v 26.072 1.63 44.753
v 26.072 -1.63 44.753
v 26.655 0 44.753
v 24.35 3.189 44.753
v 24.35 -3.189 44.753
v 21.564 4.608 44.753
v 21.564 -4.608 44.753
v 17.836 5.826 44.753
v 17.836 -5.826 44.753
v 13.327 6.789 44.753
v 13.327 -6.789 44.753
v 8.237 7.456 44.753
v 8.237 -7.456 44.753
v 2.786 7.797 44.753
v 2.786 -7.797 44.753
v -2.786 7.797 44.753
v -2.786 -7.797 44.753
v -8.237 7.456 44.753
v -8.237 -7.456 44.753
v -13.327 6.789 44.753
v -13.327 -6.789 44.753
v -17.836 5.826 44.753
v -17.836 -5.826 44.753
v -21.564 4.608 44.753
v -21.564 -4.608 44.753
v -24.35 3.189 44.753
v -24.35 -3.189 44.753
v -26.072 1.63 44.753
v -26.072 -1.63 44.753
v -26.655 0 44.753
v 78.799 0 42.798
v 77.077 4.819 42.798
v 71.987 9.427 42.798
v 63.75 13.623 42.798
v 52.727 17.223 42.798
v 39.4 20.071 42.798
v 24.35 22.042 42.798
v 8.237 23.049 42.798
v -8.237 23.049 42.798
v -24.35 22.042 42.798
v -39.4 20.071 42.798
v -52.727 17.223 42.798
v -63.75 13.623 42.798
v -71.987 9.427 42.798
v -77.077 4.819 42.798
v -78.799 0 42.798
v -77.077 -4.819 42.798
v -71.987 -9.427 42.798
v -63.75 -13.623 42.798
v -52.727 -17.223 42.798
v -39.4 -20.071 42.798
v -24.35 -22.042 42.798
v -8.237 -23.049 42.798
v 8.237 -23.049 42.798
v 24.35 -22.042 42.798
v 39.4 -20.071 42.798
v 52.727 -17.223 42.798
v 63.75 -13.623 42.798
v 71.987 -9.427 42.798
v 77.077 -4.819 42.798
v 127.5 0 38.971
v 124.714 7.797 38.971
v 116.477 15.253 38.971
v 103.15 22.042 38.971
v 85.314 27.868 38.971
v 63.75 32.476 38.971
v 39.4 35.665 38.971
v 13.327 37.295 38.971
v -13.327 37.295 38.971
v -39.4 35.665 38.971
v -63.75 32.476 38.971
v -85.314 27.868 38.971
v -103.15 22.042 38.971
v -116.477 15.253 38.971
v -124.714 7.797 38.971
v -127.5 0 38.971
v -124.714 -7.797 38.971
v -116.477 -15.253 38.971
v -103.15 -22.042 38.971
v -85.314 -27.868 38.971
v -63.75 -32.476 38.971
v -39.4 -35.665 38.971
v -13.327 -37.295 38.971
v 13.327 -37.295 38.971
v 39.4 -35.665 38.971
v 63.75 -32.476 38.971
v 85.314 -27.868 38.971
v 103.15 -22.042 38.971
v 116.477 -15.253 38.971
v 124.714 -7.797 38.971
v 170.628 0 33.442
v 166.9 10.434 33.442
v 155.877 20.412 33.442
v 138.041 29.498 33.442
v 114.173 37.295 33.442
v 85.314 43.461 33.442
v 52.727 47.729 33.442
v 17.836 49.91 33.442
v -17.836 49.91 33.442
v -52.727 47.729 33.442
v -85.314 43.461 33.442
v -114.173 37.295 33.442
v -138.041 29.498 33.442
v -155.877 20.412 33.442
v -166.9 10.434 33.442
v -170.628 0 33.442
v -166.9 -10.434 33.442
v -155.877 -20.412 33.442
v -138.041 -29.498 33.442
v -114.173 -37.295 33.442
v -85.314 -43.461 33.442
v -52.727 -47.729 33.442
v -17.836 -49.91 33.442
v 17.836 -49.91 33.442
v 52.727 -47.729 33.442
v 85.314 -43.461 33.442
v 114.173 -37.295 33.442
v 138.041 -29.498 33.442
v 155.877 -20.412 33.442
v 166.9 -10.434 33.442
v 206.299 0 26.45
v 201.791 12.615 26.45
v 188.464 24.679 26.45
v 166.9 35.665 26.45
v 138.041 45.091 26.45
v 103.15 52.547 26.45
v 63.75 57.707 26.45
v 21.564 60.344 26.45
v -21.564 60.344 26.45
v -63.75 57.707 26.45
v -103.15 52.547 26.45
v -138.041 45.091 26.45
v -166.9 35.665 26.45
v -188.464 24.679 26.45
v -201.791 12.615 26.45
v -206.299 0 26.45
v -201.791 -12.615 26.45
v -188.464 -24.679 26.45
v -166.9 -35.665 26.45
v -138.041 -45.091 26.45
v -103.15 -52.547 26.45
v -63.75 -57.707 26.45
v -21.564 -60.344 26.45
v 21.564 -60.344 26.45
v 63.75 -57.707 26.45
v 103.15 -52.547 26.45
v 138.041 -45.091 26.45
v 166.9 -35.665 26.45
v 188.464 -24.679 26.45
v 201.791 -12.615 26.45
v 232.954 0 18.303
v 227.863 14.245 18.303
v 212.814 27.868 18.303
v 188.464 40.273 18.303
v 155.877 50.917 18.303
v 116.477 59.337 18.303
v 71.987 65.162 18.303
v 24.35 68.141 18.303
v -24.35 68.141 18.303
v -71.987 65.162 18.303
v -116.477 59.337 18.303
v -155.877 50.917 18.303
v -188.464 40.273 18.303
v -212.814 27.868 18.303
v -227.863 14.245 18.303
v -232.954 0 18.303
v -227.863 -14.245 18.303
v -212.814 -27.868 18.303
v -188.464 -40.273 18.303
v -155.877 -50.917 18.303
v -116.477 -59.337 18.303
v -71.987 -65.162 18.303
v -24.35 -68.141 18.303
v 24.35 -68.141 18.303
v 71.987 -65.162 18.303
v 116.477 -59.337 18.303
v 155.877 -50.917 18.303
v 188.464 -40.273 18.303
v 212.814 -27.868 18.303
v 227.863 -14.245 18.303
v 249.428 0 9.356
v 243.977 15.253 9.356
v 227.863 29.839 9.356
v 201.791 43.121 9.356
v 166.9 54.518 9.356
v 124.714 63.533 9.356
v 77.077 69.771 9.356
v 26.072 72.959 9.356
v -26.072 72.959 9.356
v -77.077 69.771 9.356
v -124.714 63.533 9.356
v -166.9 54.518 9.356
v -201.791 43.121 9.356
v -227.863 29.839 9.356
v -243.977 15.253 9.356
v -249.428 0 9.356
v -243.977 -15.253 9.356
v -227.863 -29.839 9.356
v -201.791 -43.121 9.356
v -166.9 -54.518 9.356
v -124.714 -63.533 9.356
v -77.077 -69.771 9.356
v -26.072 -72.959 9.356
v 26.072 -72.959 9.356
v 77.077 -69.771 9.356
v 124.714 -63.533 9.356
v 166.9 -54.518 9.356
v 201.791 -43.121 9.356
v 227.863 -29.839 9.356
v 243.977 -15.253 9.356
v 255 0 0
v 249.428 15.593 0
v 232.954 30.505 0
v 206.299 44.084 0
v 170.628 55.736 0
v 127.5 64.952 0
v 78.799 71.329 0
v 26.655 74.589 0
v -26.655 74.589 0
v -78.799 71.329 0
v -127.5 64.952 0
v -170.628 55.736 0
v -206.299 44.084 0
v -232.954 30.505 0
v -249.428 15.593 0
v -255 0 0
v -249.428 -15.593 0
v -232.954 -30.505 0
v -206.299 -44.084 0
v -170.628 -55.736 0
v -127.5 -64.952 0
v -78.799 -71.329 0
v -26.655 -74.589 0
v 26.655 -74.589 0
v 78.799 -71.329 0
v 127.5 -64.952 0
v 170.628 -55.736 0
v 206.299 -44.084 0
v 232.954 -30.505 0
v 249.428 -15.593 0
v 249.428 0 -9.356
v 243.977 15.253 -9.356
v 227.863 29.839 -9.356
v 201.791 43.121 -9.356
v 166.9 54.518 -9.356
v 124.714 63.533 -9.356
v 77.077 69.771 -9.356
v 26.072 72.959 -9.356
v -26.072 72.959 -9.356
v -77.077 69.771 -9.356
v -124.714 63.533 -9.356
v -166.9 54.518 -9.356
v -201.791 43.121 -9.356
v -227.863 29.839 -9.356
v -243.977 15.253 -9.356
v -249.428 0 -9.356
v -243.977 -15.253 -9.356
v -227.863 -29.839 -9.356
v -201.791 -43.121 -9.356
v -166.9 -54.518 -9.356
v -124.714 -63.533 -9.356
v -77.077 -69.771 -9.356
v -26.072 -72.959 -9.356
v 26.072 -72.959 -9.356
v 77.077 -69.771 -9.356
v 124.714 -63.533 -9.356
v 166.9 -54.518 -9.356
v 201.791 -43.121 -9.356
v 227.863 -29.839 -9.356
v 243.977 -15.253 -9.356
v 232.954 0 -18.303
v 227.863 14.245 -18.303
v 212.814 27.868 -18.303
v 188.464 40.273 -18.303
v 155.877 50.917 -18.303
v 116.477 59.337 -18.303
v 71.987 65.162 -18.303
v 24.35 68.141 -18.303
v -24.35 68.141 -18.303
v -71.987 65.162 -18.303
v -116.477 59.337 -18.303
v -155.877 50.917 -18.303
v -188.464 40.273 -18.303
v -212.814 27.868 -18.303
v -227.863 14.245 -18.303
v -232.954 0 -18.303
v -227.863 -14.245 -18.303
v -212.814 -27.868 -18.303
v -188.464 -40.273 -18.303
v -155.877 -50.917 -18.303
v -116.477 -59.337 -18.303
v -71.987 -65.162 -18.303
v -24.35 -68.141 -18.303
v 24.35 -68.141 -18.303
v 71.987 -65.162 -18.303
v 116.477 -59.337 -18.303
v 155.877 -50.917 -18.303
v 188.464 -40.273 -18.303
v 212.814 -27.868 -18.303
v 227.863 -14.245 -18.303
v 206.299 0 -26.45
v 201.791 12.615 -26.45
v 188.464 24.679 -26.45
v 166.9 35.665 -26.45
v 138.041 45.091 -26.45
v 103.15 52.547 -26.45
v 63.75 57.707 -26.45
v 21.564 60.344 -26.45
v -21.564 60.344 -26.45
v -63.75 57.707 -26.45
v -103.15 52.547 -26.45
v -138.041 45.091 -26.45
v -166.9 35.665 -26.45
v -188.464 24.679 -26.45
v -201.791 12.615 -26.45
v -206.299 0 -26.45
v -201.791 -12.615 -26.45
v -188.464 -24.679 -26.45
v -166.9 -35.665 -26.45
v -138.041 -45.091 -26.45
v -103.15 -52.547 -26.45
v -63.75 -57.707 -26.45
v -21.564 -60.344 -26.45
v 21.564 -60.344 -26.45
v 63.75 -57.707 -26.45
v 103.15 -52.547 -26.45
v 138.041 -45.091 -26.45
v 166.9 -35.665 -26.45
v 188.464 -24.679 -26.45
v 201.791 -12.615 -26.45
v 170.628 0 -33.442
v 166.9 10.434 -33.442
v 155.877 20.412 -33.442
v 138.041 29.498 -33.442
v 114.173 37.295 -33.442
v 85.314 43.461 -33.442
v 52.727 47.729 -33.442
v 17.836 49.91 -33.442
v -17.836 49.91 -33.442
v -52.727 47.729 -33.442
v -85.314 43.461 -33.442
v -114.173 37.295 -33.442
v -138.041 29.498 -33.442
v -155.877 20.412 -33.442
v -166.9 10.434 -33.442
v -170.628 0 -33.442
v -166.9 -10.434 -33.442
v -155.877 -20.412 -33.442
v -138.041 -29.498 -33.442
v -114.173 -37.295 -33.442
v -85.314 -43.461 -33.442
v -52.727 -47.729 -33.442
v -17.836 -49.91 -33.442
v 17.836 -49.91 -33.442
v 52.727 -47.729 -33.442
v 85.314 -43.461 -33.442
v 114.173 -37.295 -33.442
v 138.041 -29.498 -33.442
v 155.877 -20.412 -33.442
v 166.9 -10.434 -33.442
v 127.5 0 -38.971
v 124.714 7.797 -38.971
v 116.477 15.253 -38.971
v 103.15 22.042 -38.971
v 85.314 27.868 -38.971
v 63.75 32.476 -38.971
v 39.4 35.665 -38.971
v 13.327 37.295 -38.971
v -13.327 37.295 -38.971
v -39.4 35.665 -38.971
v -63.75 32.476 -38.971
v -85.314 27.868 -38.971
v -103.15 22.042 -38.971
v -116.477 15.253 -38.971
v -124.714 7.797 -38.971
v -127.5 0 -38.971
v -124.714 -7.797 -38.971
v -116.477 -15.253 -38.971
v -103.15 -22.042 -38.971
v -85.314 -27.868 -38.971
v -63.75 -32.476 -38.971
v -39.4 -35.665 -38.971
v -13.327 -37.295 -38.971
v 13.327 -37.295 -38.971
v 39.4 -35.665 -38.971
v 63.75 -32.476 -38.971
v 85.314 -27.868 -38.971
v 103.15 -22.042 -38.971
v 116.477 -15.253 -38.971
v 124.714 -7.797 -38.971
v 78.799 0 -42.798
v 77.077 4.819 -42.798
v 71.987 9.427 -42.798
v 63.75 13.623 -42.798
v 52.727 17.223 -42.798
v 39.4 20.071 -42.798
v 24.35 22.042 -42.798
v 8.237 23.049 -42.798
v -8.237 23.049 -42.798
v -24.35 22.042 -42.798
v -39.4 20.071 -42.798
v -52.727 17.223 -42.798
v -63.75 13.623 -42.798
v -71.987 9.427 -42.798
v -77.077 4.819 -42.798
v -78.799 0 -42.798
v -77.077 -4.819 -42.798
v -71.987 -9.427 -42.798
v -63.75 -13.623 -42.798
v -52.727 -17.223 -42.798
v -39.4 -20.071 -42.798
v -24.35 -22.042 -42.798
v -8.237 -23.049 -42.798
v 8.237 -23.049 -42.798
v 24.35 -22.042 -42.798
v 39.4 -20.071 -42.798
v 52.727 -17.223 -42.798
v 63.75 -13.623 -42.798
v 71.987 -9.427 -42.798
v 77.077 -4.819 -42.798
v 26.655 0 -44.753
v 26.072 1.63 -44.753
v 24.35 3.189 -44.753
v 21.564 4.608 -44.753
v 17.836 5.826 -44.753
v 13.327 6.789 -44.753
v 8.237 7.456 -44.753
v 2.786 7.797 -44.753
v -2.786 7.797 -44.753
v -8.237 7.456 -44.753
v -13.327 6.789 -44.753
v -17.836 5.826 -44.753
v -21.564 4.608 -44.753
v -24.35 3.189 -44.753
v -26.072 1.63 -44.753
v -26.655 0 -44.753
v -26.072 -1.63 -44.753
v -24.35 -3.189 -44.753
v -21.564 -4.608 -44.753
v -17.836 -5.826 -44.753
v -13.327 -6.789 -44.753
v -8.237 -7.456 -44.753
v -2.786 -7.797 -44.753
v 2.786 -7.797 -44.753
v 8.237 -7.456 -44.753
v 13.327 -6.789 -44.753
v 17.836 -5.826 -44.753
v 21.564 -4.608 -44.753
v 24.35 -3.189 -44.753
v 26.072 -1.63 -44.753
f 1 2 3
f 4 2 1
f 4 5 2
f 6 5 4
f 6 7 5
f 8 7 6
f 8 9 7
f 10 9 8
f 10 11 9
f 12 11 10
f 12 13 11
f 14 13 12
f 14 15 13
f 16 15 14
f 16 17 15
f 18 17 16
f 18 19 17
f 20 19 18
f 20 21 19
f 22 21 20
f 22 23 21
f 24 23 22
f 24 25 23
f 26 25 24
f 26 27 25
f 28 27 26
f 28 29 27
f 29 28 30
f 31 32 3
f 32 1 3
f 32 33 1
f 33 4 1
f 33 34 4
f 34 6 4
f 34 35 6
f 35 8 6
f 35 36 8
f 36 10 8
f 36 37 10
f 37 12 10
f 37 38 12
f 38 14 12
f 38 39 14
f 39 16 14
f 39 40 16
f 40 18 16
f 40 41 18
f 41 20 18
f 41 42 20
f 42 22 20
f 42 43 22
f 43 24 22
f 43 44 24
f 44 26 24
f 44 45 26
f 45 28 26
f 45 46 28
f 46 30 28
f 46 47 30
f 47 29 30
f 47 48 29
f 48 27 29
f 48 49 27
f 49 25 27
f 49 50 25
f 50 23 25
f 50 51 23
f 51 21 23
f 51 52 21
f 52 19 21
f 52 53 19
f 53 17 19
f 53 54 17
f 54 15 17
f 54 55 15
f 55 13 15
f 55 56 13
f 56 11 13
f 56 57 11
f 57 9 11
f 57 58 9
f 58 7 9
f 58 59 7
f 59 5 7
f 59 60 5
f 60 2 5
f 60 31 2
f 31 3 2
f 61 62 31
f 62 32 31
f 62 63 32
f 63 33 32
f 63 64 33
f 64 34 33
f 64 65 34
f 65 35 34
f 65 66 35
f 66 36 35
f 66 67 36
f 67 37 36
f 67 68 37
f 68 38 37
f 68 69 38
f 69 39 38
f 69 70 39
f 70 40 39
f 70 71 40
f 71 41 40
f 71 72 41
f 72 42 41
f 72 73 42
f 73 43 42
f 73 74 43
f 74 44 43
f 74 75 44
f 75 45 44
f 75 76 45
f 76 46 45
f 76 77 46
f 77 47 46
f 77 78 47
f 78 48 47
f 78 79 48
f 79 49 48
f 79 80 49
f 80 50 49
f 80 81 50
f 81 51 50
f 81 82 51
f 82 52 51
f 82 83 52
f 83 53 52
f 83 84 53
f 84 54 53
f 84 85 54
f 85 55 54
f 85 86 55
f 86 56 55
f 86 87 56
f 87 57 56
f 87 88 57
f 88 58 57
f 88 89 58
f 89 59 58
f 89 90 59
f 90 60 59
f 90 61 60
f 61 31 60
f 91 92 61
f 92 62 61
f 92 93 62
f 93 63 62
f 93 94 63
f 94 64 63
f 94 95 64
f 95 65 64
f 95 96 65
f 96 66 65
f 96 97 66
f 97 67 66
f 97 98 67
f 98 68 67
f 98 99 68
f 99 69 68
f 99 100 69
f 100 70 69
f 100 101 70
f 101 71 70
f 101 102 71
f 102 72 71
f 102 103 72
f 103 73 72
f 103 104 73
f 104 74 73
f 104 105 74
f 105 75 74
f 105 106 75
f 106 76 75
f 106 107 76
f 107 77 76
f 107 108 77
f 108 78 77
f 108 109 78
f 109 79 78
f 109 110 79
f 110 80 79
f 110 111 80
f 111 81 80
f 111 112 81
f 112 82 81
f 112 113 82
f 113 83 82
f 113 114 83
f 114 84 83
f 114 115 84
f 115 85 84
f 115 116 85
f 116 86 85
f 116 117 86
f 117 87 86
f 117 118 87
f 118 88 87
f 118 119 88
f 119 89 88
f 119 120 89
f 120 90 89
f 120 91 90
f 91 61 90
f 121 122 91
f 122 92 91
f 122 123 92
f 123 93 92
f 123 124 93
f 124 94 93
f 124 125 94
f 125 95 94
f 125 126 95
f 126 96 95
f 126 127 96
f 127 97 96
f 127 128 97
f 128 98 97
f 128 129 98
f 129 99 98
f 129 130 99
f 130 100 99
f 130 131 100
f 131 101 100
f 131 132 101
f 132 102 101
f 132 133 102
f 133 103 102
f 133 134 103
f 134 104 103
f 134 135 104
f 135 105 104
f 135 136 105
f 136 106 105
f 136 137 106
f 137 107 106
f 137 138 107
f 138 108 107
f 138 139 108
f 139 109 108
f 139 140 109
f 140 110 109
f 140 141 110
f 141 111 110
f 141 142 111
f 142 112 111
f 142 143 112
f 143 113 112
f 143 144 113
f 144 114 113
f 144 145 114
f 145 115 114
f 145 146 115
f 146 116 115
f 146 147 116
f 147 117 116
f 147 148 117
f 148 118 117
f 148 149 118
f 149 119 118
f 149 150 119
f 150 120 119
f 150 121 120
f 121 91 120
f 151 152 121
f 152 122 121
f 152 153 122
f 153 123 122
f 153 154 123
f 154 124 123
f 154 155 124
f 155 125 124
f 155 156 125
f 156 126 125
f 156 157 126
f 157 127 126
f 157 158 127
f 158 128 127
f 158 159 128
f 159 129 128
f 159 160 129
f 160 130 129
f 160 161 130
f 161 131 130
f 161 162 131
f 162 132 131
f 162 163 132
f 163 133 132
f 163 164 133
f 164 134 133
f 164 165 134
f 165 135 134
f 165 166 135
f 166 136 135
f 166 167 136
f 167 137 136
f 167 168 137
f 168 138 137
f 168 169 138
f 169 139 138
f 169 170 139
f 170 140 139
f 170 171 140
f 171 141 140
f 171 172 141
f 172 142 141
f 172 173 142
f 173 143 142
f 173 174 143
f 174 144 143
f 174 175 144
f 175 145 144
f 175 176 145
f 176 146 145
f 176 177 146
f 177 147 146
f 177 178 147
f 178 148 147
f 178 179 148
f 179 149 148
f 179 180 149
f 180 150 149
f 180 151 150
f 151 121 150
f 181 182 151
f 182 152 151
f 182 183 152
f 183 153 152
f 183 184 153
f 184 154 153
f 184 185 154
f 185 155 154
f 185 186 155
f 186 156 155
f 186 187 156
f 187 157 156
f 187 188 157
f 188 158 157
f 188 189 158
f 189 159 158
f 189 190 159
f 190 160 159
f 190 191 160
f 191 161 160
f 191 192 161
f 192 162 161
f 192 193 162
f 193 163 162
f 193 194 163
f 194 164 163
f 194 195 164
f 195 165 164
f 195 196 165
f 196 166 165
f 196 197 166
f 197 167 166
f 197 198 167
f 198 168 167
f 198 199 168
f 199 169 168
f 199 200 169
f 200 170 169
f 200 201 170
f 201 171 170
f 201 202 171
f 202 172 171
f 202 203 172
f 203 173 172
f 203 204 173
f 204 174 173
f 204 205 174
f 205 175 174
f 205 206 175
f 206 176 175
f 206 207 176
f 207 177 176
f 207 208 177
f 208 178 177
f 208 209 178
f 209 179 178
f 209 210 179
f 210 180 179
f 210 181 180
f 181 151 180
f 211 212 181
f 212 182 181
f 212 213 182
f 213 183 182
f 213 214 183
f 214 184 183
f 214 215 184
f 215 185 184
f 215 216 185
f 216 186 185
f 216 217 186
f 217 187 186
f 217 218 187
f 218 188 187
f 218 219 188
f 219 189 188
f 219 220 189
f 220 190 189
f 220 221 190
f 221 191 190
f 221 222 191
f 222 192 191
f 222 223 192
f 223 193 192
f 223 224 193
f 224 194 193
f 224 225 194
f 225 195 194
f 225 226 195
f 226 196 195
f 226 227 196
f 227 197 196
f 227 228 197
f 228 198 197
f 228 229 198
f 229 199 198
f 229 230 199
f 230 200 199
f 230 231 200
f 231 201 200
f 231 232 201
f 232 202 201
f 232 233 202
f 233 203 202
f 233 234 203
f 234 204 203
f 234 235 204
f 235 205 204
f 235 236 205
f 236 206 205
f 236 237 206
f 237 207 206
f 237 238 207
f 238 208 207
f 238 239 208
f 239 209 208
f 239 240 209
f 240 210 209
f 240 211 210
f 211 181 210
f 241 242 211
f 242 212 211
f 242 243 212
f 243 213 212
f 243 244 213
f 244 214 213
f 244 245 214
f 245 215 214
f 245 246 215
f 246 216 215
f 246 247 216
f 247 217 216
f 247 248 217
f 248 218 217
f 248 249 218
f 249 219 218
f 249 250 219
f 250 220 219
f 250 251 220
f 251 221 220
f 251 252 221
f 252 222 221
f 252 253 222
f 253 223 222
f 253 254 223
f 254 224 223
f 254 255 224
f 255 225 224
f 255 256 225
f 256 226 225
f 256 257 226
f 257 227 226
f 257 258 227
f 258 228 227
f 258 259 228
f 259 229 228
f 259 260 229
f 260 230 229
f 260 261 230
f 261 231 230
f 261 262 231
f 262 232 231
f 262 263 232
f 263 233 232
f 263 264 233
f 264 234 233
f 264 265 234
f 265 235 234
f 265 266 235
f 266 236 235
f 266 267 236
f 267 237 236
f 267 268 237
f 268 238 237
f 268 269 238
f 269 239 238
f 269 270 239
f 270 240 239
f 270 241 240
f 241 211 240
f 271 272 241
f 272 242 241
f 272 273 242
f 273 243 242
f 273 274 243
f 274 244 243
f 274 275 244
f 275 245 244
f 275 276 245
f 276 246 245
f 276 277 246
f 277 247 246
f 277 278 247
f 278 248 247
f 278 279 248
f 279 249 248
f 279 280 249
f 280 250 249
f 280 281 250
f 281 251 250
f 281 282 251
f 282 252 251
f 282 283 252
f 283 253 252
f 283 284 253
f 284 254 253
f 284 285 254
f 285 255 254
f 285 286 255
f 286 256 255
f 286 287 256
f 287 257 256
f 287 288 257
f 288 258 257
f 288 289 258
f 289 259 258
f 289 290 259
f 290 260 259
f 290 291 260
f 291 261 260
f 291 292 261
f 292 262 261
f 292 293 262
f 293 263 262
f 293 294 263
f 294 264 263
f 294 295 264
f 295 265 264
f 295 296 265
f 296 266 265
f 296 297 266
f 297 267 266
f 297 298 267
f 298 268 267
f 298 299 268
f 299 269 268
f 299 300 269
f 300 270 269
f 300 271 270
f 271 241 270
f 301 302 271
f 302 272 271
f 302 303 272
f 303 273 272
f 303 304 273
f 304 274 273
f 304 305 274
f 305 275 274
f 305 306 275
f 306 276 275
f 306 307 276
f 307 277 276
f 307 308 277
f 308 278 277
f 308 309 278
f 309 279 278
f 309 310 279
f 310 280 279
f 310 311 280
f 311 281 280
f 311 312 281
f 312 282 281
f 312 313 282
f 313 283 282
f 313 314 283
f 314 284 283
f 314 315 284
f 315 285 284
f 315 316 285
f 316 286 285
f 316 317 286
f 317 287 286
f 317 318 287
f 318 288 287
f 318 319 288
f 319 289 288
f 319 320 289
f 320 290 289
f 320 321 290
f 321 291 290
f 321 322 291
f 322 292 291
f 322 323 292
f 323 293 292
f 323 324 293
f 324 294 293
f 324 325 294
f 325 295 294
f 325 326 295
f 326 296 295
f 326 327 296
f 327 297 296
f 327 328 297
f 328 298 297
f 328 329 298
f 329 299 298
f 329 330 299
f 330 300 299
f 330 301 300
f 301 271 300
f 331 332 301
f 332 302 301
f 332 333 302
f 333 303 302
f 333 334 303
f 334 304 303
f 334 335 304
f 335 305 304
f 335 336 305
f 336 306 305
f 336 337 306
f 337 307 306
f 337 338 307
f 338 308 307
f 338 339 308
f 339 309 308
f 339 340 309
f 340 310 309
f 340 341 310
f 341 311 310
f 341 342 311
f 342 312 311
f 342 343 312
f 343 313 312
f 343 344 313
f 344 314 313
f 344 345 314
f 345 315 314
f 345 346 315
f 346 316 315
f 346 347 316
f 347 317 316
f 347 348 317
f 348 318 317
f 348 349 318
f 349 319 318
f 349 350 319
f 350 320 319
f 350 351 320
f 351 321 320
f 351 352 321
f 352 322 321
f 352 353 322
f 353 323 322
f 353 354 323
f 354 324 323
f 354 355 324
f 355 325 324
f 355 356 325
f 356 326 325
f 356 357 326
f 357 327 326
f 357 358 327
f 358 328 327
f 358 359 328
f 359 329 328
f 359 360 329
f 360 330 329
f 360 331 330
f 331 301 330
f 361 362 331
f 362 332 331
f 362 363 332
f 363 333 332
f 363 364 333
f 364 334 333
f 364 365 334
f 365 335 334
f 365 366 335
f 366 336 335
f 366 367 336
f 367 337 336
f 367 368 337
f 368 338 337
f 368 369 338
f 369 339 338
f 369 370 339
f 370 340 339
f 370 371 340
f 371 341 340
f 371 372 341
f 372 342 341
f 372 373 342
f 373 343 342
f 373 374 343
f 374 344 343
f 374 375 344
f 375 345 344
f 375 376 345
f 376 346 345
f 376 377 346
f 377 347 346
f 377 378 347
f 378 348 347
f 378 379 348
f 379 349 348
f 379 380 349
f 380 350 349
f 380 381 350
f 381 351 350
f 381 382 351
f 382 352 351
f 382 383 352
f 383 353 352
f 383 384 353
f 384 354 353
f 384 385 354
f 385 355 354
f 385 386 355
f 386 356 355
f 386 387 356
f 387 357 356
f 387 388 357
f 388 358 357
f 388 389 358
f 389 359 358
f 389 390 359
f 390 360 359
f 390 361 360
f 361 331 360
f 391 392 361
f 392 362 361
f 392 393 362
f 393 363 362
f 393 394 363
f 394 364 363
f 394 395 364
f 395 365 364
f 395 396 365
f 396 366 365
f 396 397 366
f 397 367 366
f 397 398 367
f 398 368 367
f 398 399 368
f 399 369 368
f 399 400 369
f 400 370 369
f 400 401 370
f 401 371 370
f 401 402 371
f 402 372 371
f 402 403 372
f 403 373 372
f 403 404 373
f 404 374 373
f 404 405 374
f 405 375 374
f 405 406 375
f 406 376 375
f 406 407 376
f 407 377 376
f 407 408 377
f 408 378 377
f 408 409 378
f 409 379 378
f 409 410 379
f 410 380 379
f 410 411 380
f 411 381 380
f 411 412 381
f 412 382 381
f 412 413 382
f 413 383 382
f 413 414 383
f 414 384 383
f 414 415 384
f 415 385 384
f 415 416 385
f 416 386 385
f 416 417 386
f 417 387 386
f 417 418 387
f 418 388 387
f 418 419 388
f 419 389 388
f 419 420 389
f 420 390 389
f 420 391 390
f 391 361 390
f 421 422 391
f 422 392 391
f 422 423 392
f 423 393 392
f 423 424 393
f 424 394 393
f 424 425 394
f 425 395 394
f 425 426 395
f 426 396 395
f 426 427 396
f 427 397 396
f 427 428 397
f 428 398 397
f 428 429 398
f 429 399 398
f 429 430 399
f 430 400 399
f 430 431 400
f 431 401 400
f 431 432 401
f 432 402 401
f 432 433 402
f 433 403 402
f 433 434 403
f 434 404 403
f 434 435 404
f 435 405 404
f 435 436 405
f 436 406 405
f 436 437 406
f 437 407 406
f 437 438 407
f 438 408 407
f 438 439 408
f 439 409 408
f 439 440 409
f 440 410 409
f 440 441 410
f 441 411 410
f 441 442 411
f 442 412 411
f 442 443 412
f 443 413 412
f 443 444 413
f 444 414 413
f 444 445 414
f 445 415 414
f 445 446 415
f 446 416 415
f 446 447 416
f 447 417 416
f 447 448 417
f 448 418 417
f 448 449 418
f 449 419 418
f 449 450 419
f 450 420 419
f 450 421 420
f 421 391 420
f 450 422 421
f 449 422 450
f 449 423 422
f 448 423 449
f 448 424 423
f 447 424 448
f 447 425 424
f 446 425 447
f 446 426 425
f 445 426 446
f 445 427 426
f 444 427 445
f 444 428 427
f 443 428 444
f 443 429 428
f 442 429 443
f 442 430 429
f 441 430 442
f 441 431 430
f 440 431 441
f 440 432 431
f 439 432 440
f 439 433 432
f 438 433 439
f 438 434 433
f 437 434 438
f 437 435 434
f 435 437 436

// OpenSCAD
// Generated by SolidPython 1.0.1 on 2020-07-29 00:46:52


scale(v = [17, 5, 3]) {
	sphere(r = 15);
}
/***********************************************
*********      SolidPython code:      **********
************************************************
 
# import packages: SolidPython
from solid import *
from solid.utils import *
from itertools import chain, combinations, permutations


class Resize:

    def __init__(self, scad_file):
        self.scad_file = scad_file
        #self.scad_file = import_scad(scad_file)
        # cone/cylinder param:
        self.r1 = 0
        self.r2 = 0
        self.h = 0
        # rectangular prism param:
        self.w = 0
        self.l = 0
        # ellipse param:
        self.r = 0

    # import OpenScad code (file name corresponds to shape)


    # classify shape + parameters
    def assign(self, param1, param2, param3):
        if self.scad_file == 'cone.scad':
            self.r1 = param1
            self.r2 = param2
            self.h = param3
        elif self.scad_file == 'cylinder.scad':
            self.r1 = param1
            self.r2 = param2
            self.h = param3
        elif self.scad_file == 'rectangularPrism.scad':
            self.h = param1
            self.l = param2
            self.w = param3
        else:
            self.r = param1
            self.h = param2

    # resize parameters
    def iterate(self):
        x = range(3, 20, 2)
        i = 1
        if self.scad_file == 'cone.scad':
            tempList = list(permutations(x, 2))
            for temp in tempList:
                param1 = temp[0]
                param2 = temp[1]
                filepath = 'produced_scad_files/' + 'cone' + str(param1) + '_' + str(param2) + '_' + '.scad'
                scad_render_to_file(cylinder(h=param1, r1=param2, r2=0), filepath)

        elif self.scad_file == 'cylinder.scad':
            tempList = list(permutations(x, 3))
            for temp in tempList:
                param1 = temp[0]
                param2 = temp[1]
                filepath = 'produced_scad_files/' + 'cylinder' + str(param1) + '_' + str(param2) + '_' + '.scad'
                scad_render_to_file(cylinder(h=param1, r1=param2, r2=param2), filepath)

        elif self.scad_file == 'rectangularPrism.scad':
            tempList = list(permutations(x, 3))
            for temp in tempList:
                param1 = temp[0]
                param2 = temp[1]
                param3 = temp[2]
                filepath = 'produced_scad_files/' + 'rectangularPrism' + str(param1) + '_' + str(param2) + '_' + str(
                    param3) + '.scad'
                scad_render_to_file(cube(size=(param1, param2, param3)), filepath)

        elif self.scad_file == 'ellipse.scad':
            tempList = list(permutations(x, 4))
            for temp in tempList:
                param1 = temp[0]
                param2 = temp[1]
                param3 = temp[2]
                param4 = temp[3]
                filepath = 'produced_scad_files/' + 'ellipse' + str(param1) + '_' + str(param2) + '_' + str(param3) + '_' + str(param4) + '.scad'
                scad_render_to_file(scale([param1, param2, param3])(sphere(r=param4)), filepath)

    def render_to_scadfile(self):
        scad_render_to_file(scad, 'example.scad') 
 
************************************************/
